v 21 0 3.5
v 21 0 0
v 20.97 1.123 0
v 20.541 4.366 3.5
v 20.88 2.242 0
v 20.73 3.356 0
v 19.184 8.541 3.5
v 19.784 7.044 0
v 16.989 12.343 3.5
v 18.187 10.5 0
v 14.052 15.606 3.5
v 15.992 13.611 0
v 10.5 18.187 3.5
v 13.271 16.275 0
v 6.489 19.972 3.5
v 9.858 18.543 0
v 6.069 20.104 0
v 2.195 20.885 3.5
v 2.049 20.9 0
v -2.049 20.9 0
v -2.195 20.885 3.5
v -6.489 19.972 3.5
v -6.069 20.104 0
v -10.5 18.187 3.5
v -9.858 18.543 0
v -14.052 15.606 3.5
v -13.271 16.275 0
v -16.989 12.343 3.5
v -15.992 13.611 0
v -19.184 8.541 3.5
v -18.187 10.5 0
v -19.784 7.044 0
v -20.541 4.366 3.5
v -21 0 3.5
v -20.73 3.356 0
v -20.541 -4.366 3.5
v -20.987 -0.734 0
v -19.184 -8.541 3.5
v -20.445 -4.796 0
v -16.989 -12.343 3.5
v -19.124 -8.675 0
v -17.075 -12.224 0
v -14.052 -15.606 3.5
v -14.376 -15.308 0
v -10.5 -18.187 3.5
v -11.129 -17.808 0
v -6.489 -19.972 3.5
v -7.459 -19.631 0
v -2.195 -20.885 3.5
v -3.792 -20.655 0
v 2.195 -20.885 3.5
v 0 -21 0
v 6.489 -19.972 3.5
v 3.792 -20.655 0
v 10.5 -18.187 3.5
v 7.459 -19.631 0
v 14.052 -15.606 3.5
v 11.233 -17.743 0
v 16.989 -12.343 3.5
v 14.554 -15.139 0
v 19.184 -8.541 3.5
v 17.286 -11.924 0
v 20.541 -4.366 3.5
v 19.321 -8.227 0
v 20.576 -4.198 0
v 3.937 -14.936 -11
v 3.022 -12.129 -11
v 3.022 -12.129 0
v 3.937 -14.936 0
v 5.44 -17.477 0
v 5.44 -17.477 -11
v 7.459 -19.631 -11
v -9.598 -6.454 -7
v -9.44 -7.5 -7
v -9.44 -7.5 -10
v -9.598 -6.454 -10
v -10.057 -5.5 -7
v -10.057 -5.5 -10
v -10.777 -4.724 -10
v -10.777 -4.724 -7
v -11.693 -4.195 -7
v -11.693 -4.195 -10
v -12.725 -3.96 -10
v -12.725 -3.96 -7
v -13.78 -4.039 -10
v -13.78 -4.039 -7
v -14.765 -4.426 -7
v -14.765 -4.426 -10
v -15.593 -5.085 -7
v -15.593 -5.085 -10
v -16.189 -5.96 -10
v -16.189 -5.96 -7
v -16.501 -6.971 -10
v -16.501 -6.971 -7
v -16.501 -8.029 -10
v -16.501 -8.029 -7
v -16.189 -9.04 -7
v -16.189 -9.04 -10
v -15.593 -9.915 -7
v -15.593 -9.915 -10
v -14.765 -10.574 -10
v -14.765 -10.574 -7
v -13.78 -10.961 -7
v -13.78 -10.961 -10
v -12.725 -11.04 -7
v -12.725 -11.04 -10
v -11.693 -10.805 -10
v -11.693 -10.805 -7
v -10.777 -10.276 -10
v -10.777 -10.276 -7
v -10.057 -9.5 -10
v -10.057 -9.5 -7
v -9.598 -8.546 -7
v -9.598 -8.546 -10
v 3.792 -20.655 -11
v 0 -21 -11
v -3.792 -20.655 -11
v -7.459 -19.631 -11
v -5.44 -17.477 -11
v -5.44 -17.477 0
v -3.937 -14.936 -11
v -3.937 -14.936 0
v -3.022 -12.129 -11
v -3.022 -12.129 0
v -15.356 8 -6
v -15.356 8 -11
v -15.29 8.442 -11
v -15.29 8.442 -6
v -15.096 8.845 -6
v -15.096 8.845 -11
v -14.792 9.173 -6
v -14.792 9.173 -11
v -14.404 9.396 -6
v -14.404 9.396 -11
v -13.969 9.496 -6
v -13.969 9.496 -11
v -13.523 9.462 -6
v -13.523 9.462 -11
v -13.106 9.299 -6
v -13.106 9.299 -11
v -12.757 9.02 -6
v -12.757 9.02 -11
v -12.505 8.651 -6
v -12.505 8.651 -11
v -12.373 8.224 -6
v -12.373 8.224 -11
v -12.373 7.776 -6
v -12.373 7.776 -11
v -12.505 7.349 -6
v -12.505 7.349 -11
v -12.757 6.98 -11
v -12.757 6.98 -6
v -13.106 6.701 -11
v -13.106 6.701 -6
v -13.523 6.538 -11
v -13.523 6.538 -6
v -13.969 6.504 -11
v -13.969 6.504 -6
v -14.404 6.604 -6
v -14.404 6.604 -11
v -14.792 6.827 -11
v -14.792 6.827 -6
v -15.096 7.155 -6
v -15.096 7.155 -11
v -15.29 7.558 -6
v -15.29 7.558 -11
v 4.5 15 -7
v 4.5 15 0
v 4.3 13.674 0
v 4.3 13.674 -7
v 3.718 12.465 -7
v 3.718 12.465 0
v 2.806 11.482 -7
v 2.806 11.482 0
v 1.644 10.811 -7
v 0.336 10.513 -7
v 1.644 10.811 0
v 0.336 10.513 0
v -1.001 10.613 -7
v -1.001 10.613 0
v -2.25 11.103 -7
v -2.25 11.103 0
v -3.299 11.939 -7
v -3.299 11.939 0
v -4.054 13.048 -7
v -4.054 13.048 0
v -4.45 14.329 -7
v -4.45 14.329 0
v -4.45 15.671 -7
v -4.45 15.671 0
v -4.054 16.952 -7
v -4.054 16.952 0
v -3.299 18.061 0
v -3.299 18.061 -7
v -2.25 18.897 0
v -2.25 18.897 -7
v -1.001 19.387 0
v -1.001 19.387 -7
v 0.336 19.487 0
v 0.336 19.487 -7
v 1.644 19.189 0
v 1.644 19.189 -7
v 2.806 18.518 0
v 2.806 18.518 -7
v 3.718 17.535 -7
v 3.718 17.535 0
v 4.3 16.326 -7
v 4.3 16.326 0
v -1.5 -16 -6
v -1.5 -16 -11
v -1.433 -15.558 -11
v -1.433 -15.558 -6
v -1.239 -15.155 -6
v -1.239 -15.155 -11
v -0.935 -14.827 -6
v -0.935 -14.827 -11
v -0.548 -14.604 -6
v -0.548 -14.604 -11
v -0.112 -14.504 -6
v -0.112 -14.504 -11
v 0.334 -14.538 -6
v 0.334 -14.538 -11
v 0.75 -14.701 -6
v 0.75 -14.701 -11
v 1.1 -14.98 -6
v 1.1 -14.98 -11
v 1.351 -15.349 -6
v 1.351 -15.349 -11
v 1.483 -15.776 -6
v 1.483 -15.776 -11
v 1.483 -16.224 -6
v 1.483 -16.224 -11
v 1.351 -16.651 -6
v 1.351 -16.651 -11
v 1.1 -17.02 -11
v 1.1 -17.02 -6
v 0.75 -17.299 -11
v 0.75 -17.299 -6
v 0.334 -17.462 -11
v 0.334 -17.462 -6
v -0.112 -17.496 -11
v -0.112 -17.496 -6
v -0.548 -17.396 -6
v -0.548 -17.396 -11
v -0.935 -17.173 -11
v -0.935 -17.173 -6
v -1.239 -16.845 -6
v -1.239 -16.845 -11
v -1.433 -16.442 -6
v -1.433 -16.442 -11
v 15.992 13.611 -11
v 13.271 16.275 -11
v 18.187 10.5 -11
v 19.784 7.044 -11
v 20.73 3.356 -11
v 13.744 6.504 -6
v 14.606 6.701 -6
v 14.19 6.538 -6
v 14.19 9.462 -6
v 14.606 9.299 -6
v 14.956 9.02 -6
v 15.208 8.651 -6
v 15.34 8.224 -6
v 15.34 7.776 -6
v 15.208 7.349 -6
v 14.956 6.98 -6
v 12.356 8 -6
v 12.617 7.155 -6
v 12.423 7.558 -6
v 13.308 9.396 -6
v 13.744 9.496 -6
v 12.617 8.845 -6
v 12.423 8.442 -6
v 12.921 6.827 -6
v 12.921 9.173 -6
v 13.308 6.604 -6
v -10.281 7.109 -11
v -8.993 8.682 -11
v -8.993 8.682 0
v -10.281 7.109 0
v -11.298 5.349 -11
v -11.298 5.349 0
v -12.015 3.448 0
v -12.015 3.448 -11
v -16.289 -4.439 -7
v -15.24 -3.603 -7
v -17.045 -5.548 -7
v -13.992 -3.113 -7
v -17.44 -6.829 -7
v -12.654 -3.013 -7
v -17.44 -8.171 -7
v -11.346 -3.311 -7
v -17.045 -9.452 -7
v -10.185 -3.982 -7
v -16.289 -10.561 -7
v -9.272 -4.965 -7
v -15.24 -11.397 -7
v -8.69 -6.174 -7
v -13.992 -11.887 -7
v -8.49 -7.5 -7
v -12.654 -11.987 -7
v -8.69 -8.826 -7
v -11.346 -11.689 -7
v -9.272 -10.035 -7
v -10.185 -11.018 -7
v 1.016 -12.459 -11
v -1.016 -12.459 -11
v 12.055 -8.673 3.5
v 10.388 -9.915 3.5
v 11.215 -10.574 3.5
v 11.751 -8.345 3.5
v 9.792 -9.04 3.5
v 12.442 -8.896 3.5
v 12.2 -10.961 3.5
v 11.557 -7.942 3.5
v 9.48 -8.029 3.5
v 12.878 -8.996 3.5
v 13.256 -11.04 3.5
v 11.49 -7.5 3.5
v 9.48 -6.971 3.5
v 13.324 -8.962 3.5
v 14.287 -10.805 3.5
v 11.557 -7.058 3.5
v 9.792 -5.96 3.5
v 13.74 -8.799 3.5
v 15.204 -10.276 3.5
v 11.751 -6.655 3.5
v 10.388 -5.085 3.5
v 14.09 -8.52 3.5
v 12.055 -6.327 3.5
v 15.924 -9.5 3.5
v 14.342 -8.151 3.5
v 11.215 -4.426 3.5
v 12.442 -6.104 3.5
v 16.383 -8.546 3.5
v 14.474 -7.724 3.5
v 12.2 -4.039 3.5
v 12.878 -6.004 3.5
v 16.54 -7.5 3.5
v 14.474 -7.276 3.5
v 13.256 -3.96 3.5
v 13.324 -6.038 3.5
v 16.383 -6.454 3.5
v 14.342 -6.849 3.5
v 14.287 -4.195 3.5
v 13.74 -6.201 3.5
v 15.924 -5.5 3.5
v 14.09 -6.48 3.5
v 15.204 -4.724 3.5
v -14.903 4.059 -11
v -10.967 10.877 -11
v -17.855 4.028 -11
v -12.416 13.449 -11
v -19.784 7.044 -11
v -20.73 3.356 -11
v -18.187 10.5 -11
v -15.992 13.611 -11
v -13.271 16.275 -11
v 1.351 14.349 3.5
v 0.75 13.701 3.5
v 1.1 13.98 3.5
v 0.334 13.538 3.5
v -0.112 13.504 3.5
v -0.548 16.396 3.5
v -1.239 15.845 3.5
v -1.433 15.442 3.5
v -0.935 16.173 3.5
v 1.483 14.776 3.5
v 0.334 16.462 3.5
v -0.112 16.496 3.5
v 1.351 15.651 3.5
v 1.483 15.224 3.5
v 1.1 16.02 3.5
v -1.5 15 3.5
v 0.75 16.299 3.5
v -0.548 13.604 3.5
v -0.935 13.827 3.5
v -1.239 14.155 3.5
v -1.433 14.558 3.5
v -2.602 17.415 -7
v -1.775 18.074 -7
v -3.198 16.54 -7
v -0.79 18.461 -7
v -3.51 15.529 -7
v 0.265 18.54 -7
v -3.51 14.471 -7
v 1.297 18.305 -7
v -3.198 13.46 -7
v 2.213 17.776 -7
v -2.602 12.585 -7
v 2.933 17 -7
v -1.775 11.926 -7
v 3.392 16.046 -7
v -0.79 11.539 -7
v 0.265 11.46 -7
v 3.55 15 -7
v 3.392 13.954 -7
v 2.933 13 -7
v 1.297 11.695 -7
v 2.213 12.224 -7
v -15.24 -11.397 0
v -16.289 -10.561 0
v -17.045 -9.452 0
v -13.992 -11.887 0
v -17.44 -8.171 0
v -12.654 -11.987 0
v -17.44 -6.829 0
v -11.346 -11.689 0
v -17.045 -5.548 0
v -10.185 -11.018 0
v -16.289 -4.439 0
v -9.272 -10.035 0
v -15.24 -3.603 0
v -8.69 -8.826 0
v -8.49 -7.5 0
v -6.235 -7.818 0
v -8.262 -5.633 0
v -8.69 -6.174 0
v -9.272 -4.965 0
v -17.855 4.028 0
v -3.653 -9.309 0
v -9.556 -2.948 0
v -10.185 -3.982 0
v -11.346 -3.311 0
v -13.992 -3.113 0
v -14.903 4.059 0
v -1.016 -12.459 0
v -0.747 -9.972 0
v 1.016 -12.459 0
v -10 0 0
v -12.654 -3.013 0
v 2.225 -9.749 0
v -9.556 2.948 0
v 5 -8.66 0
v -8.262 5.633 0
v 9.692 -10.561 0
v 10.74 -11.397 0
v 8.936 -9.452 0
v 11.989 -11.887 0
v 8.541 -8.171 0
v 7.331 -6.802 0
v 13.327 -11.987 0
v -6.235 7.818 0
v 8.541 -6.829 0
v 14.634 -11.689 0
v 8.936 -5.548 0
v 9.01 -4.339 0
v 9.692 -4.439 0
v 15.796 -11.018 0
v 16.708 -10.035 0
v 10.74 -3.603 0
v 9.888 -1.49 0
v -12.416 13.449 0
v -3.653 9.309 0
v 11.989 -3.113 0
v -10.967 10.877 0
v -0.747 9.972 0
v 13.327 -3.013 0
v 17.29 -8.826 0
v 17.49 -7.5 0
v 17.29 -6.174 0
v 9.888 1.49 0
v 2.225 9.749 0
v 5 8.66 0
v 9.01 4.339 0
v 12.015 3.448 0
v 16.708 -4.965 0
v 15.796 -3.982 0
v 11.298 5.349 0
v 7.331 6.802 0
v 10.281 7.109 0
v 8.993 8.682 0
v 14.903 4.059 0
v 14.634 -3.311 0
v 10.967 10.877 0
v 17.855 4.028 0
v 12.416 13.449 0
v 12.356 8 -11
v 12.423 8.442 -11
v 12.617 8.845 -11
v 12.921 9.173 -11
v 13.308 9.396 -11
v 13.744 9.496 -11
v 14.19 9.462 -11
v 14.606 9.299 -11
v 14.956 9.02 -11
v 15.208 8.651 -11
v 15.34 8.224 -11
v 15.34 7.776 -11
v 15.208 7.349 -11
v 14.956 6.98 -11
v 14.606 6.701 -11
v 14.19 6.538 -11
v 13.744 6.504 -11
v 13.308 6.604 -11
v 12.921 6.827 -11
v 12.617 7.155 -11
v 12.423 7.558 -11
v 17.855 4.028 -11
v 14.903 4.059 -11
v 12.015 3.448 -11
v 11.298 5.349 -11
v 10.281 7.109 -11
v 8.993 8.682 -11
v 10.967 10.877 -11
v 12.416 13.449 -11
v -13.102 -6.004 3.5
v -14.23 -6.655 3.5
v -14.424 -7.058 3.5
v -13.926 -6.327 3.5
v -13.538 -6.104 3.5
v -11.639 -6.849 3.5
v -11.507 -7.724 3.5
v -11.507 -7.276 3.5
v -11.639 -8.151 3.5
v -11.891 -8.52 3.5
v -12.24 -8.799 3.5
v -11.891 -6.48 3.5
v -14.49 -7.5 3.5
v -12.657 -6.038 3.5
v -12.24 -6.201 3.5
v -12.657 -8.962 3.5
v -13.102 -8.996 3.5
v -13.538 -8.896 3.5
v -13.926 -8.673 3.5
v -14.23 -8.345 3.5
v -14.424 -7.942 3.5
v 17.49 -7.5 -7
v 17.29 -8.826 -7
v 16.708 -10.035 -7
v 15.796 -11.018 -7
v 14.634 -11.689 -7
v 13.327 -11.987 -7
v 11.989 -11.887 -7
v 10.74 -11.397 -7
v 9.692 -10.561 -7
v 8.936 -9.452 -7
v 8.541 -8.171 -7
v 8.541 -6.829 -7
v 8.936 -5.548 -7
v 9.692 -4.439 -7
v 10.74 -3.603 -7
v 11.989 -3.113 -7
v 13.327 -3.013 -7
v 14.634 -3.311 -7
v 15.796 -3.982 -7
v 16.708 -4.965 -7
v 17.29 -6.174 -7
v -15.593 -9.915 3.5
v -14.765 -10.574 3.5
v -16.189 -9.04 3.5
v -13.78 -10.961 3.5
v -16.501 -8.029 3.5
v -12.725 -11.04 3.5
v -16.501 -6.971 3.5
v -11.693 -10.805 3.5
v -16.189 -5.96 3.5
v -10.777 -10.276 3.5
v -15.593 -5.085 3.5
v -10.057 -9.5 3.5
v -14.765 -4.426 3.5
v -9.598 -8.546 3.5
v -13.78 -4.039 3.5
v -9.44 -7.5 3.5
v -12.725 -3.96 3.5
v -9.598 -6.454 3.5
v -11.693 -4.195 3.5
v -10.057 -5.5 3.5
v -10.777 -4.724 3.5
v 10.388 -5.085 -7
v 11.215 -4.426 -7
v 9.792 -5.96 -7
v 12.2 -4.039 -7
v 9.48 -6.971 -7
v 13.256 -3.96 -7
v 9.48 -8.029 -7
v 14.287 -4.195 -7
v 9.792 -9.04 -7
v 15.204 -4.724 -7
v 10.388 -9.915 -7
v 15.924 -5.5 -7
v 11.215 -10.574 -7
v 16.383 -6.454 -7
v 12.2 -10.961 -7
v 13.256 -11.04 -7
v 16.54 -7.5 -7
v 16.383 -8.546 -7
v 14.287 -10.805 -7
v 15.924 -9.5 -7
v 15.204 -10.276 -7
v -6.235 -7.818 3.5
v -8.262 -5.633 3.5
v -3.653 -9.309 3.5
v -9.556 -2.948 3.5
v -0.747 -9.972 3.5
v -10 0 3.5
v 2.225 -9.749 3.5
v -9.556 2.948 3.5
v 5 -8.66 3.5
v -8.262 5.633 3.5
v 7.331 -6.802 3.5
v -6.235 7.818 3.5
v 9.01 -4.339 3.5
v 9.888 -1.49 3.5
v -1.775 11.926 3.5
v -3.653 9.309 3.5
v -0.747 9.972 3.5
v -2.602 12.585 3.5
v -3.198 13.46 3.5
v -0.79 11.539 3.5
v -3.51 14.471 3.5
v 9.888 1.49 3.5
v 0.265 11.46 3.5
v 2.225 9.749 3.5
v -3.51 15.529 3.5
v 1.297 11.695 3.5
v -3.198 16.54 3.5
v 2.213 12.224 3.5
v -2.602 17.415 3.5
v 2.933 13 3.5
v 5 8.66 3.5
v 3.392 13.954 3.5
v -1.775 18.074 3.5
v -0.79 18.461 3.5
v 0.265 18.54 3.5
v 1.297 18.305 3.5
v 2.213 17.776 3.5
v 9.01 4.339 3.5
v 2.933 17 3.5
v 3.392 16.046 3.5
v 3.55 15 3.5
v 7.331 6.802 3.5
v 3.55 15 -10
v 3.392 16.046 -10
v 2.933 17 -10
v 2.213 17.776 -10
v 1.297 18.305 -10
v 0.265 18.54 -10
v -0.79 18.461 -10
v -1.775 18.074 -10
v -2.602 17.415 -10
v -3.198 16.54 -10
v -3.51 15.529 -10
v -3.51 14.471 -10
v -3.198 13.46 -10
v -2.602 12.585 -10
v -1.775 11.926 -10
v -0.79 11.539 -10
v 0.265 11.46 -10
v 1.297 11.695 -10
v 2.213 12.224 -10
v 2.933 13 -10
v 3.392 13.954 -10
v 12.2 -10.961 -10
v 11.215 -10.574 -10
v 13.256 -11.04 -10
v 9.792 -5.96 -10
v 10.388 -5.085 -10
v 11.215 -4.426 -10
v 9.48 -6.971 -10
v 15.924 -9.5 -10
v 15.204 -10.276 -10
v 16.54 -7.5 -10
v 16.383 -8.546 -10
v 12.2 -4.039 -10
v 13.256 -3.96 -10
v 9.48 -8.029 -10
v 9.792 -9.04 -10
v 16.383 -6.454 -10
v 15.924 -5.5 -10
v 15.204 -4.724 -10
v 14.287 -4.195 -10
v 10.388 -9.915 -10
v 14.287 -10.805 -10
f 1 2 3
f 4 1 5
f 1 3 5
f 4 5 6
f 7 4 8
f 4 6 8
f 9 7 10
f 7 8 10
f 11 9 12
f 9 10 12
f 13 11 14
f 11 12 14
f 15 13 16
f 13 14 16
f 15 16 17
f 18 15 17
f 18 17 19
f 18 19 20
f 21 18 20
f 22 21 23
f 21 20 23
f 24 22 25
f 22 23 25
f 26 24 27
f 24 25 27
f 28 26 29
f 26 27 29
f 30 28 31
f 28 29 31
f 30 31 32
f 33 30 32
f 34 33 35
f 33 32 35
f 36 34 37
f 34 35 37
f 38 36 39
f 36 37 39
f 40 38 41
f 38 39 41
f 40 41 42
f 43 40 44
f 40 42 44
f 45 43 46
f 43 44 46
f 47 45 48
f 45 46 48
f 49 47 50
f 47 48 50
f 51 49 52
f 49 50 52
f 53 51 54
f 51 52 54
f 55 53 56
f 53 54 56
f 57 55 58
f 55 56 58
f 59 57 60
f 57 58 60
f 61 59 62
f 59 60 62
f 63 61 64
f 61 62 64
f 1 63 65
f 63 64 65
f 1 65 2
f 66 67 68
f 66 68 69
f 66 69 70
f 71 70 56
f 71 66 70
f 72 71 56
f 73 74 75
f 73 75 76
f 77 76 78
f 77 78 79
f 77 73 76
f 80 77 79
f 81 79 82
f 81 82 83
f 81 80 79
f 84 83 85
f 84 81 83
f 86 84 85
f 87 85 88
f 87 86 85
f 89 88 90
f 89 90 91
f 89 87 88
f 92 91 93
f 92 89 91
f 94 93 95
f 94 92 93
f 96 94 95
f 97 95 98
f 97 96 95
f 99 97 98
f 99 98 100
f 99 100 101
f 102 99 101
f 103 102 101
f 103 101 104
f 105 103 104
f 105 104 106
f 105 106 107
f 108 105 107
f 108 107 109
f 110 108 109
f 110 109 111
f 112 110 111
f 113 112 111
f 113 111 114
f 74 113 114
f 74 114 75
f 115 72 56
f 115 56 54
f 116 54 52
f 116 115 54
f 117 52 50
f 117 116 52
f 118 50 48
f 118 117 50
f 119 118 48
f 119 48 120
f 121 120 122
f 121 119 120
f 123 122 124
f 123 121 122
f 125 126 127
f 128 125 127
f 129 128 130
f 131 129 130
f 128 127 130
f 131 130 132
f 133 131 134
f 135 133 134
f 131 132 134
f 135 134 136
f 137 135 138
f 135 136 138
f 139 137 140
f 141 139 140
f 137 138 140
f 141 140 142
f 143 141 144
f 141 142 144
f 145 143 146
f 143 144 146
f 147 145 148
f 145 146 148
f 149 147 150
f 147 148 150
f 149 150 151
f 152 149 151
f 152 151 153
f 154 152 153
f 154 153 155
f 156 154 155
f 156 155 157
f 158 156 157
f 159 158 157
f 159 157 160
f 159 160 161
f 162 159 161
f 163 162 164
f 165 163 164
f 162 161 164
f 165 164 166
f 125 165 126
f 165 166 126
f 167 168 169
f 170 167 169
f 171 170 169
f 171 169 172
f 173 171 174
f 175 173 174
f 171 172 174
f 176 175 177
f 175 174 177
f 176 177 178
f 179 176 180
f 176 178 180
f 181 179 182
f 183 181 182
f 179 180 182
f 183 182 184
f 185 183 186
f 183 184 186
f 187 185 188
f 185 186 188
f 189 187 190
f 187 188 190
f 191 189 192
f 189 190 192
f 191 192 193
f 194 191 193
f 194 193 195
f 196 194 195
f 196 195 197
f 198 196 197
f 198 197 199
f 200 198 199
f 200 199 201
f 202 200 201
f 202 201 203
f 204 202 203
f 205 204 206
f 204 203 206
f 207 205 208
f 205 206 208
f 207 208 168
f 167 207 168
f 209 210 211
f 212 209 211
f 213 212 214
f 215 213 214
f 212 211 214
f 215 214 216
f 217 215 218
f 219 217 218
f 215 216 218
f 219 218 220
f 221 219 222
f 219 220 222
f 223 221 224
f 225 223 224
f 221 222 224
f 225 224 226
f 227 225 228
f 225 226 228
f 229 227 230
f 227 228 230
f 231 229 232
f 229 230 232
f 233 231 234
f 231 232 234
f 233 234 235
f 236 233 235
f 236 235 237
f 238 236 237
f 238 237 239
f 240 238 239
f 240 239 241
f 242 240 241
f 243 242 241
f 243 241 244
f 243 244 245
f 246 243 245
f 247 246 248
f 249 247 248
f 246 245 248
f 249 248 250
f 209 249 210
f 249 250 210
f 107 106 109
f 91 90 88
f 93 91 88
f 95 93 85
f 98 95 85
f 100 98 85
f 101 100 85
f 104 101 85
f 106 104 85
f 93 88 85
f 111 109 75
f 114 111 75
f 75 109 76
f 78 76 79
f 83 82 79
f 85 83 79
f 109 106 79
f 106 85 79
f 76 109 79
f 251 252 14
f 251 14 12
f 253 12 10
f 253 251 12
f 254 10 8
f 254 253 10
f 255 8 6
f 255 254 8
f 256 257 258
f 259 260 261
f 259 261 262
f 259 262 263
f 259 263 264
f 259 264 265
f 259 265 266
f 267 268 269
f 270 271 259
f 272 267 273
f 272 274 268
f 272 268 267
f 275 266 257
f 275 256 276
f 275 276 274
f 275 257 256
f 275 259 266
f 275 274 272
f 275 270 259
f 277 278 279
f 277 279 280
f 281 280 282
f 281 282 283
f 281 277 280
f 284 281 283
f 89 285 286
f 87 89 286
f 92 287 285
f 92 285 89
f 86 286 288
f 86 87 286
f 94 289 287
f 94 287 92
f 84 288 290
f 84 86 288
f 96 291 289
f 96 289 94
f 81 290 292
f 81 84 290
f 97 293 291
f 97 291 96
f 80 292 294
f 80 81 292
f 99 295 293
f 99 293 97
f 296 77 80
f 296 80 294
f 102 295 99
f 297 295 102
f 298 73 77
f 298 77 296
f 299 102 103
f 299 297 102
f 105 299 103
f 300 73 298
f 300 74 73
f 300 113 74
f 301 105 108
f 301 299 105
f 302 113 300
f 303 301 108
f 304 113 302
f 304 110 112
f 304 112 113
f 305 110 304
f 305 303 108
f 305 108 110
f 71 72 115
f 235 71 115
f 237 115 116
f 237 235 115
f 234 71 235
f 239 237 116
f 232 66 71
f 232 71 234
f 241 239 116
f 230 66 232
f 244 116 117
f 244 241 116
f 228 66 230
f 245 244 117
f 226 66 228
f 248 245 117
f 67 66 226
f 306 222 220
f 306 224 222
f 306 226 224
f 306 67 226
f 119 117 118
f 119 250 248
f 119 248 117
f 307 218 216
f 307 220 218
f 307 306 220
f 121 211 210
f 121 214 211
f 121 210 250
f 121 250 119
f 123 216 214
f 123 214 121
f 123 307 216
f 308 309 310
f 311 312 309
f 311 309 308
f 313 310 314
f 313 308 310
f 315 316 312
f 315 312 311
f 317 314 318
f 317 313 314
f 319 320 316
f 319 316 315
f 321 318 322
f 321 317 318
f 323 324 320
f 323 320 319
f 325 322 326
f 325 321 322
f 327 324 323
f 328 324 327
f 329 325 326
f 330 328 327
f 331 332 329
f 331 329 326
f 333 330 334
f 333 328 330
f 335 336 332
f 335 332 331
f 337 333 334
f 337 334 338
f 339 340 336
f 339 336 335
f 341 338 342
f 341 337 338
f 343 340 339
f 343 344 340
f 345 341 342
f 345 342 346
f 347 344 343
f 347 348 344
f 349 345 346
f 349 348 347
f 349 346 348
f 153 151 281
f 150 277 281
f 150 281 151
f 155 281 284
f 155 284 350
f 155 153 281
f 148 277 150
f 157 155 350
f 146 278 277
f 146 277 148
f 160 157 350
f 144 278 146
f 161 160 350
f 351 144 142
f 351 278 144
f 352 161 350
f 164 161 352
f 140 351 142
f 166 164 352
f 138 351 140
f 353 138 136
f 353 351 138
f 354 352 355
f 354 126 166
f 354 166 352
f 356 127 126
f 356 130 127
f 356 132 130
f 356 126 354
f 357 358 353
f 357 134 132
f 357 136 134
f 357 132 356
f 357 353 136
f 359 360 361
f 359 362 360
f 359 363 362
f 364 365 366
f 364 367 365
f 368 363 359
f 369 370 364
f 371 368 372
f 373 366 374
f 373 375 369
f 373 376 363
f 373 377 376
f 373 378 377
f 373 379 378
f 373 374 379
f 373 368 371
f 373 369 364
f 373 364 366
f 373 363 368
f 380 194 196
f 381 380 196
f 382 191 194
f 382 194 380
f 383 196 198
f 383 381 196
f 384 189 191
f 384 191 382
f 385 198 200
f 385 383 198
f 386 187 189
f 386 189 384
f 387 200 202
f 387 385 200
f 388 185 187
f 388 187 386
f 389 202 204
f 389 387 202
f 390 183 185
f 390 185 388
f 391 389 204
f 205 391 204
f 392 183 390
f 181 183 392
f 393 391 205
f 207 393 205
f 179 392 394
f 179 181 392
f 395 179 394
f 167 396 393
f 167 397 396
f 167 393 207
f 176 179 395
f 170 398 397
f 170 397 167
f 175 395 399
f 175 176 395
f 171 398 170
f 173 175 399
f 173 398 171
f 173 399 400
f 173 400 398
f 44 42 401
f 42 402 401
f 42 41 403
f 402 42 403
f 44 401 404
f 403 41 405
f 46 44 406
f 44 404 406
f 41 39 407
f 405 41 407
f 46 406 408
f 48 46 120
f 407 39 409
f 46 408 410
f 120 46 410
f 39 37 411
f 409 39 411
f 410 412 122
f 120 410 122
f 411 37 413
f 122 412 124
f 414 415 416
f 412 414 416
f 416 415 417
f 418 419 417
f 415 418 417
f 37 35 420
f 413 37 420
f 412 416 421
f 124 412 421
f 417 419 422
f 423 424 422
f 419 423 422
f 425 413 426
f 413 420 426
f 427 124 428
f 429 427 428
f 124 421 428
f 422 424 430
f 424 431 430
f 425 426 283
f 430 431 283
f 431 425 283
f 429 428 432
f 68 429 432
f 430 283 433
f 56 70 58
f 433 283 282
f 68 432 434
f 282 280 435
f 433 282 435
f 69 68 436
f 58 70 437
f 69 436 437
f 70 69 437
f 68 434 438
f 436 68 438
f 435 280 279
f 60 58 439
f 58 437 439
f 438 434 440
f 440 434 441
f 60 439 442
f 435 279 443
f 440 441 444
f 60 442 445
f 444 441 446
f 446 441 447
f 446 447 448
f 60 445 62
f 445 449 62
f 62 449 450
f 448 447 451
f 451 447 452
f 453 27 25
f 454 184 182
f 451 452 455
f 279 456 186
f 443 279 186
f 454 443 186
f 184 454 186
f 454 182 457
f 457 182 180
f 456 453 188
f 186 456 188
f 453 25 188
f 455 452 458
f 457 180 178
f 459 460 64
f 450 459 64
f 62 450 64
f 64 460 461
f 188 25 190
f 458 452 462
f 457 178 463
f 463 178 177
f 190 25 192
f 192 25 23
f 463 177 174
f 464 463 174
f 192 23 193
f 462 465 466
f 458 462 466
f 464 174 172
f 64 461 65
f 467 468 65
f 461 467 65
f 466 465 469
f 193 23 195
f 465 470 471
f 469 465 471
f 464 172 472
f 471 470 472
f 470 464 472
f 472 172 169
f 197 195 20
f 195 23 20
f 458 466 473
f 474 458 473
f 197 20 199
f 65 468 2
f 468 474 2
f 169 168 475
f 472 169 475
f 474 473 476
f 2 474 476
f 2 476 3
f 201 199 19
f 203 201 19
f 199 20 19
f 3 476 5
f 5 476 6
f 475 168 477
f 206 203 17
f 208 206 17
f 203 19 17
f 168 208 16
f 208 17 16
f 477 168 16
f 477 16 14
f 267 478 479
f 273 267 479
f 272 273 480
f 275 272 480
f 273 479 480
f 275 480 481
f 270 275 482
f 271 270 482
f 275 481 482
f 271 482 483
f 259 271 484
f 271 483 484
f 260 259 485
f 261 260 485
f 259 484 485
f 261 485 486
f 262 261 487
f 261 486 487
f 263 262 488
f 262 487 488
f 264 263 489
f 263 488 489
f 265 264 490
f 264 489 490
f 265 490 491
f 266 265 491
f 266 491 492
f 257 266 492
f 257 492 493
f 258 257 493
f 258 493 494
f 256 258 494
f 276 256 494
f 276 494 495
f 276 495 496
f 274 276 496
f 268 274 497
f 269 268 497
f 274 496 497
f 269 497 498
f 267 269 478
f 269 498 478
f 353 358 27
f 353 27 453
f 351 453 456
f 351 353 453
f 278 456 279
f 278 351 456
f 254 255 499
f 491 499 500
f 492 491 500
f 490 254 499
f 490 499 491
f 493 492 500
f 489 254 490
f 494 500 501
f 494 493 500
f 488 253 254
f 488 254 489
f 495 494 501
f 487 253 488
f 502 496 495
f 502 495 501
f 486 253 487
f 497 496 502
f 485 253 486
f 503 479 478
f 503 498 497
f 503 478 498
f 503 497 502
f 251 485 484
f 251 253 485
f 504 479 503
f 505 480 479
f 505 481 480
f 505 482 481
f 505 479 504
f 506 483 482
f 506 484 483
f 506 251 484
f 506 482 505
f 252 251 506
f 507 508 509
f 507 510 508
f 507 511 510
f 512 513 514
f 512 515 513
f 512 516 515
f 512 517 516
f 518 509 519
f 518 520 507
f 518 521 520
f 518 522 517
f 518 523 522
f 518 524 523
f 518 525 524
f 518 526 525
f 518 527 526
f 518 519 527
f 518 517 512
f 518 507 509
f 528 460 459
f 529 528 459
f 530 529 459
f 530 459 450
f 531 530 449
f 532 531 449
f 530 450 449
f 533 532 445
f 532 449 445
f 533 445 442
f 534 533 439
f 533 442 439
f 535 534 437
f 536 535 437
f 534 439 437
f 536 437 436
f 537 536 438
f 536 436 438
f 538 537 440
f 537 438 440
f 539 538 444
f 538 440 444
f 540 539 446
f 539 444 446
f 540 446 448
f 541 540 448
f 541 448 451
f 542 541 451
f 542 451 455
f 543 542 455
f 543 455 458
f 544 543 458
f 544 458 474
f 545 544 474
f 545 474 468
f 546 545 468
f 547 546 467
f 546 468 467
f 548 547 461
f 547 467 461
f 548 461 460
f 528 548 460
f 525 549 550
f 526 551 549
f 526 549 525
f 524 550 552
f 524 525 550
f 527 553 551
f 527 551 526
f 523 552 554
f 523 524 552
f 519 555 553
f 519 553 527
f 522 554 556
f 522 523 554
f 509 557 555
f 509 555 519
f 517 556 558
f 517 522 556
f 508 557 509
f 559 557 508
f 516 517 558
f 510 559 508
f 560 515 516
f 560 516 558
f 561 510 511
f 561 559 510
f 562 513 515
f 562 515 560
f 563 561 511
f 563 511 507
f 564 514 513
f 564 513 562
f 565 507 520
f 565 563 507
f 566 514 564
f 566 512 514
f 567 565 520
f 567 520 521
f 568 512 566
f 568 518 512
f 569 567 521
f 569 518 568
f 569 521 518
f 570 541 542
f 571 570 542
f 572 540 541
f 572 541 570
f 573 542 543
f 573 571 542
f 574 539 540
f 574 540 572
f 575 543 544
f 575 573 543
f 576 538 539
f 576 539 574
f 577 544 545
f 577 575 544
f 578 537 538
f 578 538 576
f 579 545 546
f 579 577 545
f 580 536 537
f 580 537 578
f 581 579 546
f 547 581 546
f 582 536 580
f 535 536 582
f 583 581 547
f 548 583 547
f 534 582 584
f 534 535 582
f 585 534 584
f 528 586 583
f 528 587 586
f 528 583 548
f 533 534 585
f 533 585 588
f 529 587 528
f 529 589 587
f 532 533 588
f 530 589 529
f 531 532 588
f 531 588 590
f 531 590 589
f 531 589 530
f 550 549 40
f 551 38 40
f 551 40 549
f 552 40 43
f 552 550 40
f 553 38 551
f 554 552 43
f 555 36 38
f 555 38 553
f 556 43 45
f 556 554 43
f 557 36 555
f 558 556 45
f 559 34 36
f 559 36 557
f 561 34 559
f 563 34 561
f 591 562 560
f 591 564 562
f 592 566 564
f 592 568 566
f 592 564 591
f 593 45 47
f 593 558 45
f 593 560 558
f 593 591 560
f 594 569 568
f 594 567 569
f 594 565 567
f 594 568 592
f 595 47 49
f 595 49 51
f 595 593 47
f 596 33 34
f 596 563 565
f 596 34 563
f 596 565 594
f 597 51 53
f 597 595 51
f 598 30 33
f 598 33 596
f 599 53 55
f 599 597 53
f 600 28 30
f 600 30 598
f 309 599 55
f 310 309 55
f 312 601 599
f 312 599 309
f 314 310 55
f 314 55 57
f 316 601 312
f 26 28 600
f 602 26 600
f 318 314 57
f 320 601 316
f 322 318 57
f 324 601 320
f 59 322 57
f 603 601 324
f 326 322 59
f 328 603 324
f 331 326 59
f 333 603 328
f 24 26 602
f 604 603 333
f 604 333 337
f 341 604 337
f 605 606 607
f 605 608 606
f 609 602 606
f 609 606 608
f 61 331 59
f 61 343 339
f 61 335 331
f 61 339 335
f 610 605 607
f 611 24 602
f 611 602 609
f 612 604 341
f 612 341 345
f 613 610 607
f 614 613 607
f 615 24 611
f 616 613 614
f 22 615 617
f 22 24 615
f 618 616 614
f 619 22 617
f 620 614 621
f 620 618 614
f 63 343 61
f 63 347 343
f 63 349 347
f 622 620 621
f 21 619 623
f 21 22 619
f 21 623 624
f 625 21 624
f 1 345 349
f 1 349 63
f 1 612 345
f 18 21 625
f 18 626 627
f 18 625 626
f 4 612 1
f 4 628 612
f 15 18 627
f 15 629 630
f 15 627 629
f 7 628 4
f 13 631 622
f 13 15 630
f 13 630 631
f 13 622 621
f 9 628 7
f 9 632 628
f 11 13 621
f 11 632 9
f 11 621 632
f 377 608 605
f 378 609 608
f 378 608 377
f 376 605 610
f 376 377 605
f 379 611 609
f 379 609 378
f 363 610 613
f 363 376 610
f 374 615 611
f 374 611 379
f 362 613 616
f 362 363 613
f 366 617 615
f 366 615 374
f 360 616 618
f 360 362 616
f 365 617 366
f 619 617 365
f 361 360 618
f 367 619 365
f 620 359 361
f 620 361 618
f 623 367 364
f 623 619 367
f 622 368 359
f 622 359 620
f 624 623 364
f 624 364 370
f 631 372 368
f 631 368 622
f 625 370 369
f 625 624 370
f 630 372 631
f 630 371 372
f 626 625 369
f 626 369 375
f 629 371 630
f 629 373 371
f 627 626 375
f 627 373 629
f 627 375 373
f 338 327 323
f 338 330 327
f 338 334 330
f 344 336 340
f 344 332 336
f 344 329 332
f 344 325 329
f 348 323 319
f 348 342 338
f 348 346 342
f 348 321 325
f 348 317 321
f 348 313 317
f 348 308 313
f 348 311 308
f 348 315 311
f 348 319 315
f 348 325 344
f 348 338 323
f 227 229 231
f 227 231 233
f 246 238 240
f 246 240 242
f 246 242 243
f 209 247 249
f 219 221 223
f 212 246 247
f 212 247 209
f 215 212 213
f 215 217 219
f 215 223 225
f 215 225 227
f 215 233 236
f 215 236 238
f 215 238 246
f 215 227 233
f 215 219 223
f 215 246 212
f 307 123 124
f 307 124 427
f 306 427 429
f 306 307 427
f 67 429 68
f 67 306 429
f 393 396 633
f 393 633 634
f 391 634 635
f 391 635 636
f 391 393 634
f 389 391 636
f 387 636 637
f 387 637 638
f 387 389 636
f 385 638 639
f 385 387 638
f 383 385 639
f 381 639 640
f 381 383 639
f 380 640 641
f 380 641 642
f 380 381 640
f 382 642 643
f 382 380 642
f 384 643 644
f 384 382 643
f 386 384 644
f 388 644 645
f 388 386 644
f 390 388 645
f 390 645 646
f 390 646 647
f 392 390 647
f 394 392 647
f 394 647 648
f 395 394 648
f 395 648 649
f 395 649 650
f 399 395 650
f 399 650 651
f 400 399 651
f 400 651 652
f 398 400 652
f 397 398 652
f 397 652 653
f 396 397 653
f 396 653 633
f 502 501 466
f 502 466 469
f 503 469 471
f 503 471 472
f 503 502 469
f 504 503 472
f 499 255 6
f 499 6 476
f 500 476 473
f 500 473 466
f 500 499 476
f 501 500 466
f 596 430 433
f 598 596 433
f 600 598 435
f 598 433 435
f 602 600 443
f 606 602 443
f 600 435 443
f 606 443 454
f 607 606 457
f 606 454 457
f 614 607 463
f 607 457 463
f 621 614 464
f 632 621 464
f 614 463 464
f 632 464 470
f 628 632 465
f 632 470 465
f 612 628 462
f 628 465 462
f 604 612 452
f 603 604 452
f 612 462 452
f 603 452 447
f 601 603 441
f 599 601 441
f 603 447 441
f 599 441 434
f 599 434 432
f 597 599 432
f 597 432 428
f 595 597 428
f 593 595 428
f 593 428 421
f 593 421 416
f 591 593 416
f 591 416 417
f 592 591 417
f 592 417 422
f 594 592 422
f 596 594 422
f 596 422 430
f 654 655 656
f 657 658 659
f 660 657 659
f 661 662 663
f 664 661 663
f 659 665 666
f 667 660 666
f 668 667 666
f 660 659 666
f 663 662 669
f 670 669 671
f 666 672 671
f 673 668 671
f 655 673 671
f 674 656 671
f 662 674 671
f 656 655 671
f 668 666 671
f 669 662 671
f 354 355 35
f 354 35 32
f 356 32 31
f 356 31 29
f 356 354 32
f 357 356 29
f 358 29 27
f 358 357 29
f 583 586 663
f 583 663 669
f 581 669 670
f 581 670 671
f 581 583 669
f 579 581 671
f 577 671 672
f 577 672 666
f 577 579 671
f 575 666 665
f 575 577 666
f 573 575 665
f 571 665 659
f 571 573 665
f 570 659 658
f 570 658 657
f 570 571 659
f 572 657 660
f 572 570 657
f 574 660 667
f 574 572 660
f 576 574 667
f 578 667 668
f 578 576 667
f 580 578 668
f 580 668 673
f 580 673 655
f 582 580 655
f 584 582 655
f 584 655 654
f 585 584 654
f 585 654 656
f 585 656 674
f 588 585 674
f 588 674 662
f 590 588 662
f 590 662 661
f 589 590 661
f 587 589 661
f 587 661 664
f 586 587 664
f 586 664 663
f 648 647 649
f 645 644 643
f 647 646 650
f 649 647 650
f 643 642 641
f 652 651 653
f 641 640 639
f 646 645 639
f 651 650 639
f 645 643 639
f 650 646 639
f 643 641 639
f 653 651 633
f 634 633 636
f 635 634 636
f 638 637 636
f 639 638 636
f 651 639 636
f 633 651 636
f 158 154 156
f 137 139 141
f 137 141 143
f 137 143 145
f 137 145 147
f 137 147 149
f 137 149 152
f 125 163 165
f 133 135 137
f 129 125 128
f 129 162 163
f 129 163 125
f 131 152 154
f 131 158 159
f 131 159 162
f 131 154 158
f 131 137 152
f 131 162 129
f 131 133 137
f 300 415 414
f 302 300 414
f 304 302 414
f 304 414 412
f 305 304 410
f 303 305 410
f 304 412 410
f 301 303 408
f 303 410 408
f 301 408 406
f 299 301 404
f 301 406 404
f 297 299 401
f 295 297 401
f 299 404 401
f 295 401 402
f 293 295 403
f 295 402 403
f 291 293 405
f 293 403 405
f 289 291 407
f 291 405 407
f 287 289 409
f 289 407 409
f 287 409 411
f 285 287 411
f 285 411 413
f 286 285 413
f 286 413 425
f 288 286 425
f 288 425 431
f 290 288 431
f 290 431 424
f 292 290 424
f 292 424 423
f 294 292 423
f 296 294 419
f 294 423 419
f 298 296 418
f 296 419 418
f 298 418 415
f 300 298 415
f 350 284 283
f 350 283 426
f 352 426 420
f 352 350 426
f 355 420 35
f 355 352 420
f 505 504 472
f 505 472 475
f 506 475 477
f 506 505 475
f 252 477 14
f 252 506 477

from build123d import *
from build123d.topology import SkipClean

# Parameters (mm, degrees)
SKETCH1_R           = 21
BOSS_EXTRUDE1_DEPTH = 3.5
SKETCH4_R           = 10
CUT_EXTRUDE1_DEPTH  = 8.2
SKETCH11_R          = 1.5
CUT_EXTRUDE2_DEPTH  = 10
BOSS_EXTRUDE2_START = 11
BOSS_EXTRUDE2_DEPTH = 11
SKETCH14_R          = 1.5
CUT_EXTRUDE3_DEPTH  = 5
SKETCH16_R          = 3.55
BOSS_EXTRUDE3_DEPTH = 13.5
SKETCH17_R          = 4.5
BOSS_EXTRUDE4_DEPTH = 7


with BuildPart() as part:
    # Sketch1 → Boss-Extrude1 (new body)
    with BuildSketch(Plane.XY):
        Circle(SKETCH1_R)
    extrude(amount=BOSS_EXTRUDE1_DEPTH)

    # Sketch4 → Cut-Extrude1 (cut)
    with BuildSketch(Plane(origin=(0, 0, 0), x_dir=(-1, 0, 0), z_dir=(0, 0, -1))):
        Circle(SKETCH4_R)
    extrude(amount=-CUT_EXTRUDE1_DEPTH, mode=Mode.SUBTRACT)

    # Sketch11 → Cut-Extrude2 (cut)
    with BuildSketch(Plane(origin=(0, 0, 0), x_dir=(-1, 0, 0), z_dir=(0, 0, -1))):
        with Locations((0, 15)):
            Circle(SKETCH11_R)
        with Locations((12.990381057, -7.5)):
            Circle(SKETCH11_R)
        with Locations((-12.990381057, -7.5)):
            Circle(SKETCH11_R)
    extrude(amount=-CUT_EXTRUDE2_DEPTH, mode=Mode.SUBTRACT)

    # Sketch3 → Boss-Extrude2 (add)
    with SkipClean():  # the faces are left unmerged after this step: merging them gives an invalid solid
        with BuildSketch(Plane(origin=(0, 0, 0), x_dir=(-1, 0, 0), z_dir=(0, 0, -1)).offset(BOSS_EXTRUDE2_START)):
            with BuildLine():
                ThreePointArc((-3.021915591, -12.129221993), (-4.618435811, -16.247865366), (-7.4589705, -19.630684121))
                ThreePointArc((-7.4589705, -19.630684121), (0, -21), (7.4589705, -19.630684121))
                ThreePointArc((7.4589705, -19.630684121), (4.618435811, -16.247865366), (3.021915591, -12.129221993))
                ThreePointArc((3.021915591, -12.129221993), (0, -12.5), (-3.021915591, -12.129221993))
            make_face()
            with BuildLine():
                ThreePointArc((-20.730156393, 3.355684121), (-16.38028207, 4.124249945), (-12.01517217, 3.447555327))
                ThreePointArc((-12.01517217, 3.447555327), (-10.825317547, 6.25), (-8.993256579, 8.681666667))
                ThreePointArc((-8.993256579, 8.681666667), (-11.761846259, 12.123615422), (-13.271185893, 16.275))
                ThreePointArc((-13.271185893, 16.275), (-18.186533479, 10.5), (-20.730156393, 3.355684121))
            make_face()
            with BuildLine():
                ThreePointArc((8.993256579, 8.681666667), (10.825317547, 6.25), (12.01517217, 3.447555327))
                ThreePointArc((12.01517217, 3.447555327), (16.38028207, 4.124249945), (20.730156393, 3.355684121))
                ThreePointArc((20.730156393, 3.355684121), (18.186533479, 10.5), (13.271185893, 16.275))
                ThreePointArc((13.271185893, 16.275), (11.761846259, 12.123615422), (8.993256579, 8.681666667))
            make_face()
        extrude(amount=-BOSS_EXTRUDE2_DEPTH)

    # Sketch14 → Cut-Extrude3 (cut)
    with SkipClean():  # the faces are left unmerged after this step: merging them gives an invalid solid
        with BuildSketch(Plane(origin=(0, 0, -11), x_dir=(-1, 0, 0), z_dir=(0, 0, -1))):
            with Locations((13.856406461, 8)):
                Circle(SKETCH14_R)
            with Locations((0, -16)):
                Circle(SKETCH14_R)
            with Locations((-13.856406461, 8)):
                Circle(SKETCH14_R)
        extrude(amount=-CUT_EXTRUDE3_DEPTH, mode=Mode.SUBTRACT)

    # Sketch16 → Boss-Extrude3 (add)
    with SkipClean():  # the faces are left unmerged after this step: merging them gives an invalid solid
        with BuildSketch(Plane.XY.offset(3.5)):
            with Locations((0, 15)):
                Circle(SKETCH16_R)
            with Locations((12.990381057, -7.5)):
                Circle(SKETCH16_R)
            with Locations((-12.990381057, -7.5)):
                Circle(SKETCH16_R)
        extrude(amount=-BOSS_EXTRUDE3_DEPTH)

    # Sketch17 → Boss-Extrude4 (add)
    with SkipClean():  # the faces are left unmerged after this step: merging them gives an invalid solid
        with BuildSketch(Plane(origin=(0, 0, 0), x_dir=(-1, 0, 0), z_dir=(0, 0, -1))):
            with Locations(Location((0, 15, 0), (0, 0, 180))):
                Circle(SKETCH17_R)
            with Locations(Location((12.990381057, -7.5, 0), (0, 0, 180))):
                Circle(SKETCH17_R)
            with Locations(Location((-12.990381057, -7.5, 0), (0, 0, 180))):
                Circle(SKETCH17_R)
        extrude(amount=BOSS_EXTRUDE4_DEPTH)


solid = part.part
